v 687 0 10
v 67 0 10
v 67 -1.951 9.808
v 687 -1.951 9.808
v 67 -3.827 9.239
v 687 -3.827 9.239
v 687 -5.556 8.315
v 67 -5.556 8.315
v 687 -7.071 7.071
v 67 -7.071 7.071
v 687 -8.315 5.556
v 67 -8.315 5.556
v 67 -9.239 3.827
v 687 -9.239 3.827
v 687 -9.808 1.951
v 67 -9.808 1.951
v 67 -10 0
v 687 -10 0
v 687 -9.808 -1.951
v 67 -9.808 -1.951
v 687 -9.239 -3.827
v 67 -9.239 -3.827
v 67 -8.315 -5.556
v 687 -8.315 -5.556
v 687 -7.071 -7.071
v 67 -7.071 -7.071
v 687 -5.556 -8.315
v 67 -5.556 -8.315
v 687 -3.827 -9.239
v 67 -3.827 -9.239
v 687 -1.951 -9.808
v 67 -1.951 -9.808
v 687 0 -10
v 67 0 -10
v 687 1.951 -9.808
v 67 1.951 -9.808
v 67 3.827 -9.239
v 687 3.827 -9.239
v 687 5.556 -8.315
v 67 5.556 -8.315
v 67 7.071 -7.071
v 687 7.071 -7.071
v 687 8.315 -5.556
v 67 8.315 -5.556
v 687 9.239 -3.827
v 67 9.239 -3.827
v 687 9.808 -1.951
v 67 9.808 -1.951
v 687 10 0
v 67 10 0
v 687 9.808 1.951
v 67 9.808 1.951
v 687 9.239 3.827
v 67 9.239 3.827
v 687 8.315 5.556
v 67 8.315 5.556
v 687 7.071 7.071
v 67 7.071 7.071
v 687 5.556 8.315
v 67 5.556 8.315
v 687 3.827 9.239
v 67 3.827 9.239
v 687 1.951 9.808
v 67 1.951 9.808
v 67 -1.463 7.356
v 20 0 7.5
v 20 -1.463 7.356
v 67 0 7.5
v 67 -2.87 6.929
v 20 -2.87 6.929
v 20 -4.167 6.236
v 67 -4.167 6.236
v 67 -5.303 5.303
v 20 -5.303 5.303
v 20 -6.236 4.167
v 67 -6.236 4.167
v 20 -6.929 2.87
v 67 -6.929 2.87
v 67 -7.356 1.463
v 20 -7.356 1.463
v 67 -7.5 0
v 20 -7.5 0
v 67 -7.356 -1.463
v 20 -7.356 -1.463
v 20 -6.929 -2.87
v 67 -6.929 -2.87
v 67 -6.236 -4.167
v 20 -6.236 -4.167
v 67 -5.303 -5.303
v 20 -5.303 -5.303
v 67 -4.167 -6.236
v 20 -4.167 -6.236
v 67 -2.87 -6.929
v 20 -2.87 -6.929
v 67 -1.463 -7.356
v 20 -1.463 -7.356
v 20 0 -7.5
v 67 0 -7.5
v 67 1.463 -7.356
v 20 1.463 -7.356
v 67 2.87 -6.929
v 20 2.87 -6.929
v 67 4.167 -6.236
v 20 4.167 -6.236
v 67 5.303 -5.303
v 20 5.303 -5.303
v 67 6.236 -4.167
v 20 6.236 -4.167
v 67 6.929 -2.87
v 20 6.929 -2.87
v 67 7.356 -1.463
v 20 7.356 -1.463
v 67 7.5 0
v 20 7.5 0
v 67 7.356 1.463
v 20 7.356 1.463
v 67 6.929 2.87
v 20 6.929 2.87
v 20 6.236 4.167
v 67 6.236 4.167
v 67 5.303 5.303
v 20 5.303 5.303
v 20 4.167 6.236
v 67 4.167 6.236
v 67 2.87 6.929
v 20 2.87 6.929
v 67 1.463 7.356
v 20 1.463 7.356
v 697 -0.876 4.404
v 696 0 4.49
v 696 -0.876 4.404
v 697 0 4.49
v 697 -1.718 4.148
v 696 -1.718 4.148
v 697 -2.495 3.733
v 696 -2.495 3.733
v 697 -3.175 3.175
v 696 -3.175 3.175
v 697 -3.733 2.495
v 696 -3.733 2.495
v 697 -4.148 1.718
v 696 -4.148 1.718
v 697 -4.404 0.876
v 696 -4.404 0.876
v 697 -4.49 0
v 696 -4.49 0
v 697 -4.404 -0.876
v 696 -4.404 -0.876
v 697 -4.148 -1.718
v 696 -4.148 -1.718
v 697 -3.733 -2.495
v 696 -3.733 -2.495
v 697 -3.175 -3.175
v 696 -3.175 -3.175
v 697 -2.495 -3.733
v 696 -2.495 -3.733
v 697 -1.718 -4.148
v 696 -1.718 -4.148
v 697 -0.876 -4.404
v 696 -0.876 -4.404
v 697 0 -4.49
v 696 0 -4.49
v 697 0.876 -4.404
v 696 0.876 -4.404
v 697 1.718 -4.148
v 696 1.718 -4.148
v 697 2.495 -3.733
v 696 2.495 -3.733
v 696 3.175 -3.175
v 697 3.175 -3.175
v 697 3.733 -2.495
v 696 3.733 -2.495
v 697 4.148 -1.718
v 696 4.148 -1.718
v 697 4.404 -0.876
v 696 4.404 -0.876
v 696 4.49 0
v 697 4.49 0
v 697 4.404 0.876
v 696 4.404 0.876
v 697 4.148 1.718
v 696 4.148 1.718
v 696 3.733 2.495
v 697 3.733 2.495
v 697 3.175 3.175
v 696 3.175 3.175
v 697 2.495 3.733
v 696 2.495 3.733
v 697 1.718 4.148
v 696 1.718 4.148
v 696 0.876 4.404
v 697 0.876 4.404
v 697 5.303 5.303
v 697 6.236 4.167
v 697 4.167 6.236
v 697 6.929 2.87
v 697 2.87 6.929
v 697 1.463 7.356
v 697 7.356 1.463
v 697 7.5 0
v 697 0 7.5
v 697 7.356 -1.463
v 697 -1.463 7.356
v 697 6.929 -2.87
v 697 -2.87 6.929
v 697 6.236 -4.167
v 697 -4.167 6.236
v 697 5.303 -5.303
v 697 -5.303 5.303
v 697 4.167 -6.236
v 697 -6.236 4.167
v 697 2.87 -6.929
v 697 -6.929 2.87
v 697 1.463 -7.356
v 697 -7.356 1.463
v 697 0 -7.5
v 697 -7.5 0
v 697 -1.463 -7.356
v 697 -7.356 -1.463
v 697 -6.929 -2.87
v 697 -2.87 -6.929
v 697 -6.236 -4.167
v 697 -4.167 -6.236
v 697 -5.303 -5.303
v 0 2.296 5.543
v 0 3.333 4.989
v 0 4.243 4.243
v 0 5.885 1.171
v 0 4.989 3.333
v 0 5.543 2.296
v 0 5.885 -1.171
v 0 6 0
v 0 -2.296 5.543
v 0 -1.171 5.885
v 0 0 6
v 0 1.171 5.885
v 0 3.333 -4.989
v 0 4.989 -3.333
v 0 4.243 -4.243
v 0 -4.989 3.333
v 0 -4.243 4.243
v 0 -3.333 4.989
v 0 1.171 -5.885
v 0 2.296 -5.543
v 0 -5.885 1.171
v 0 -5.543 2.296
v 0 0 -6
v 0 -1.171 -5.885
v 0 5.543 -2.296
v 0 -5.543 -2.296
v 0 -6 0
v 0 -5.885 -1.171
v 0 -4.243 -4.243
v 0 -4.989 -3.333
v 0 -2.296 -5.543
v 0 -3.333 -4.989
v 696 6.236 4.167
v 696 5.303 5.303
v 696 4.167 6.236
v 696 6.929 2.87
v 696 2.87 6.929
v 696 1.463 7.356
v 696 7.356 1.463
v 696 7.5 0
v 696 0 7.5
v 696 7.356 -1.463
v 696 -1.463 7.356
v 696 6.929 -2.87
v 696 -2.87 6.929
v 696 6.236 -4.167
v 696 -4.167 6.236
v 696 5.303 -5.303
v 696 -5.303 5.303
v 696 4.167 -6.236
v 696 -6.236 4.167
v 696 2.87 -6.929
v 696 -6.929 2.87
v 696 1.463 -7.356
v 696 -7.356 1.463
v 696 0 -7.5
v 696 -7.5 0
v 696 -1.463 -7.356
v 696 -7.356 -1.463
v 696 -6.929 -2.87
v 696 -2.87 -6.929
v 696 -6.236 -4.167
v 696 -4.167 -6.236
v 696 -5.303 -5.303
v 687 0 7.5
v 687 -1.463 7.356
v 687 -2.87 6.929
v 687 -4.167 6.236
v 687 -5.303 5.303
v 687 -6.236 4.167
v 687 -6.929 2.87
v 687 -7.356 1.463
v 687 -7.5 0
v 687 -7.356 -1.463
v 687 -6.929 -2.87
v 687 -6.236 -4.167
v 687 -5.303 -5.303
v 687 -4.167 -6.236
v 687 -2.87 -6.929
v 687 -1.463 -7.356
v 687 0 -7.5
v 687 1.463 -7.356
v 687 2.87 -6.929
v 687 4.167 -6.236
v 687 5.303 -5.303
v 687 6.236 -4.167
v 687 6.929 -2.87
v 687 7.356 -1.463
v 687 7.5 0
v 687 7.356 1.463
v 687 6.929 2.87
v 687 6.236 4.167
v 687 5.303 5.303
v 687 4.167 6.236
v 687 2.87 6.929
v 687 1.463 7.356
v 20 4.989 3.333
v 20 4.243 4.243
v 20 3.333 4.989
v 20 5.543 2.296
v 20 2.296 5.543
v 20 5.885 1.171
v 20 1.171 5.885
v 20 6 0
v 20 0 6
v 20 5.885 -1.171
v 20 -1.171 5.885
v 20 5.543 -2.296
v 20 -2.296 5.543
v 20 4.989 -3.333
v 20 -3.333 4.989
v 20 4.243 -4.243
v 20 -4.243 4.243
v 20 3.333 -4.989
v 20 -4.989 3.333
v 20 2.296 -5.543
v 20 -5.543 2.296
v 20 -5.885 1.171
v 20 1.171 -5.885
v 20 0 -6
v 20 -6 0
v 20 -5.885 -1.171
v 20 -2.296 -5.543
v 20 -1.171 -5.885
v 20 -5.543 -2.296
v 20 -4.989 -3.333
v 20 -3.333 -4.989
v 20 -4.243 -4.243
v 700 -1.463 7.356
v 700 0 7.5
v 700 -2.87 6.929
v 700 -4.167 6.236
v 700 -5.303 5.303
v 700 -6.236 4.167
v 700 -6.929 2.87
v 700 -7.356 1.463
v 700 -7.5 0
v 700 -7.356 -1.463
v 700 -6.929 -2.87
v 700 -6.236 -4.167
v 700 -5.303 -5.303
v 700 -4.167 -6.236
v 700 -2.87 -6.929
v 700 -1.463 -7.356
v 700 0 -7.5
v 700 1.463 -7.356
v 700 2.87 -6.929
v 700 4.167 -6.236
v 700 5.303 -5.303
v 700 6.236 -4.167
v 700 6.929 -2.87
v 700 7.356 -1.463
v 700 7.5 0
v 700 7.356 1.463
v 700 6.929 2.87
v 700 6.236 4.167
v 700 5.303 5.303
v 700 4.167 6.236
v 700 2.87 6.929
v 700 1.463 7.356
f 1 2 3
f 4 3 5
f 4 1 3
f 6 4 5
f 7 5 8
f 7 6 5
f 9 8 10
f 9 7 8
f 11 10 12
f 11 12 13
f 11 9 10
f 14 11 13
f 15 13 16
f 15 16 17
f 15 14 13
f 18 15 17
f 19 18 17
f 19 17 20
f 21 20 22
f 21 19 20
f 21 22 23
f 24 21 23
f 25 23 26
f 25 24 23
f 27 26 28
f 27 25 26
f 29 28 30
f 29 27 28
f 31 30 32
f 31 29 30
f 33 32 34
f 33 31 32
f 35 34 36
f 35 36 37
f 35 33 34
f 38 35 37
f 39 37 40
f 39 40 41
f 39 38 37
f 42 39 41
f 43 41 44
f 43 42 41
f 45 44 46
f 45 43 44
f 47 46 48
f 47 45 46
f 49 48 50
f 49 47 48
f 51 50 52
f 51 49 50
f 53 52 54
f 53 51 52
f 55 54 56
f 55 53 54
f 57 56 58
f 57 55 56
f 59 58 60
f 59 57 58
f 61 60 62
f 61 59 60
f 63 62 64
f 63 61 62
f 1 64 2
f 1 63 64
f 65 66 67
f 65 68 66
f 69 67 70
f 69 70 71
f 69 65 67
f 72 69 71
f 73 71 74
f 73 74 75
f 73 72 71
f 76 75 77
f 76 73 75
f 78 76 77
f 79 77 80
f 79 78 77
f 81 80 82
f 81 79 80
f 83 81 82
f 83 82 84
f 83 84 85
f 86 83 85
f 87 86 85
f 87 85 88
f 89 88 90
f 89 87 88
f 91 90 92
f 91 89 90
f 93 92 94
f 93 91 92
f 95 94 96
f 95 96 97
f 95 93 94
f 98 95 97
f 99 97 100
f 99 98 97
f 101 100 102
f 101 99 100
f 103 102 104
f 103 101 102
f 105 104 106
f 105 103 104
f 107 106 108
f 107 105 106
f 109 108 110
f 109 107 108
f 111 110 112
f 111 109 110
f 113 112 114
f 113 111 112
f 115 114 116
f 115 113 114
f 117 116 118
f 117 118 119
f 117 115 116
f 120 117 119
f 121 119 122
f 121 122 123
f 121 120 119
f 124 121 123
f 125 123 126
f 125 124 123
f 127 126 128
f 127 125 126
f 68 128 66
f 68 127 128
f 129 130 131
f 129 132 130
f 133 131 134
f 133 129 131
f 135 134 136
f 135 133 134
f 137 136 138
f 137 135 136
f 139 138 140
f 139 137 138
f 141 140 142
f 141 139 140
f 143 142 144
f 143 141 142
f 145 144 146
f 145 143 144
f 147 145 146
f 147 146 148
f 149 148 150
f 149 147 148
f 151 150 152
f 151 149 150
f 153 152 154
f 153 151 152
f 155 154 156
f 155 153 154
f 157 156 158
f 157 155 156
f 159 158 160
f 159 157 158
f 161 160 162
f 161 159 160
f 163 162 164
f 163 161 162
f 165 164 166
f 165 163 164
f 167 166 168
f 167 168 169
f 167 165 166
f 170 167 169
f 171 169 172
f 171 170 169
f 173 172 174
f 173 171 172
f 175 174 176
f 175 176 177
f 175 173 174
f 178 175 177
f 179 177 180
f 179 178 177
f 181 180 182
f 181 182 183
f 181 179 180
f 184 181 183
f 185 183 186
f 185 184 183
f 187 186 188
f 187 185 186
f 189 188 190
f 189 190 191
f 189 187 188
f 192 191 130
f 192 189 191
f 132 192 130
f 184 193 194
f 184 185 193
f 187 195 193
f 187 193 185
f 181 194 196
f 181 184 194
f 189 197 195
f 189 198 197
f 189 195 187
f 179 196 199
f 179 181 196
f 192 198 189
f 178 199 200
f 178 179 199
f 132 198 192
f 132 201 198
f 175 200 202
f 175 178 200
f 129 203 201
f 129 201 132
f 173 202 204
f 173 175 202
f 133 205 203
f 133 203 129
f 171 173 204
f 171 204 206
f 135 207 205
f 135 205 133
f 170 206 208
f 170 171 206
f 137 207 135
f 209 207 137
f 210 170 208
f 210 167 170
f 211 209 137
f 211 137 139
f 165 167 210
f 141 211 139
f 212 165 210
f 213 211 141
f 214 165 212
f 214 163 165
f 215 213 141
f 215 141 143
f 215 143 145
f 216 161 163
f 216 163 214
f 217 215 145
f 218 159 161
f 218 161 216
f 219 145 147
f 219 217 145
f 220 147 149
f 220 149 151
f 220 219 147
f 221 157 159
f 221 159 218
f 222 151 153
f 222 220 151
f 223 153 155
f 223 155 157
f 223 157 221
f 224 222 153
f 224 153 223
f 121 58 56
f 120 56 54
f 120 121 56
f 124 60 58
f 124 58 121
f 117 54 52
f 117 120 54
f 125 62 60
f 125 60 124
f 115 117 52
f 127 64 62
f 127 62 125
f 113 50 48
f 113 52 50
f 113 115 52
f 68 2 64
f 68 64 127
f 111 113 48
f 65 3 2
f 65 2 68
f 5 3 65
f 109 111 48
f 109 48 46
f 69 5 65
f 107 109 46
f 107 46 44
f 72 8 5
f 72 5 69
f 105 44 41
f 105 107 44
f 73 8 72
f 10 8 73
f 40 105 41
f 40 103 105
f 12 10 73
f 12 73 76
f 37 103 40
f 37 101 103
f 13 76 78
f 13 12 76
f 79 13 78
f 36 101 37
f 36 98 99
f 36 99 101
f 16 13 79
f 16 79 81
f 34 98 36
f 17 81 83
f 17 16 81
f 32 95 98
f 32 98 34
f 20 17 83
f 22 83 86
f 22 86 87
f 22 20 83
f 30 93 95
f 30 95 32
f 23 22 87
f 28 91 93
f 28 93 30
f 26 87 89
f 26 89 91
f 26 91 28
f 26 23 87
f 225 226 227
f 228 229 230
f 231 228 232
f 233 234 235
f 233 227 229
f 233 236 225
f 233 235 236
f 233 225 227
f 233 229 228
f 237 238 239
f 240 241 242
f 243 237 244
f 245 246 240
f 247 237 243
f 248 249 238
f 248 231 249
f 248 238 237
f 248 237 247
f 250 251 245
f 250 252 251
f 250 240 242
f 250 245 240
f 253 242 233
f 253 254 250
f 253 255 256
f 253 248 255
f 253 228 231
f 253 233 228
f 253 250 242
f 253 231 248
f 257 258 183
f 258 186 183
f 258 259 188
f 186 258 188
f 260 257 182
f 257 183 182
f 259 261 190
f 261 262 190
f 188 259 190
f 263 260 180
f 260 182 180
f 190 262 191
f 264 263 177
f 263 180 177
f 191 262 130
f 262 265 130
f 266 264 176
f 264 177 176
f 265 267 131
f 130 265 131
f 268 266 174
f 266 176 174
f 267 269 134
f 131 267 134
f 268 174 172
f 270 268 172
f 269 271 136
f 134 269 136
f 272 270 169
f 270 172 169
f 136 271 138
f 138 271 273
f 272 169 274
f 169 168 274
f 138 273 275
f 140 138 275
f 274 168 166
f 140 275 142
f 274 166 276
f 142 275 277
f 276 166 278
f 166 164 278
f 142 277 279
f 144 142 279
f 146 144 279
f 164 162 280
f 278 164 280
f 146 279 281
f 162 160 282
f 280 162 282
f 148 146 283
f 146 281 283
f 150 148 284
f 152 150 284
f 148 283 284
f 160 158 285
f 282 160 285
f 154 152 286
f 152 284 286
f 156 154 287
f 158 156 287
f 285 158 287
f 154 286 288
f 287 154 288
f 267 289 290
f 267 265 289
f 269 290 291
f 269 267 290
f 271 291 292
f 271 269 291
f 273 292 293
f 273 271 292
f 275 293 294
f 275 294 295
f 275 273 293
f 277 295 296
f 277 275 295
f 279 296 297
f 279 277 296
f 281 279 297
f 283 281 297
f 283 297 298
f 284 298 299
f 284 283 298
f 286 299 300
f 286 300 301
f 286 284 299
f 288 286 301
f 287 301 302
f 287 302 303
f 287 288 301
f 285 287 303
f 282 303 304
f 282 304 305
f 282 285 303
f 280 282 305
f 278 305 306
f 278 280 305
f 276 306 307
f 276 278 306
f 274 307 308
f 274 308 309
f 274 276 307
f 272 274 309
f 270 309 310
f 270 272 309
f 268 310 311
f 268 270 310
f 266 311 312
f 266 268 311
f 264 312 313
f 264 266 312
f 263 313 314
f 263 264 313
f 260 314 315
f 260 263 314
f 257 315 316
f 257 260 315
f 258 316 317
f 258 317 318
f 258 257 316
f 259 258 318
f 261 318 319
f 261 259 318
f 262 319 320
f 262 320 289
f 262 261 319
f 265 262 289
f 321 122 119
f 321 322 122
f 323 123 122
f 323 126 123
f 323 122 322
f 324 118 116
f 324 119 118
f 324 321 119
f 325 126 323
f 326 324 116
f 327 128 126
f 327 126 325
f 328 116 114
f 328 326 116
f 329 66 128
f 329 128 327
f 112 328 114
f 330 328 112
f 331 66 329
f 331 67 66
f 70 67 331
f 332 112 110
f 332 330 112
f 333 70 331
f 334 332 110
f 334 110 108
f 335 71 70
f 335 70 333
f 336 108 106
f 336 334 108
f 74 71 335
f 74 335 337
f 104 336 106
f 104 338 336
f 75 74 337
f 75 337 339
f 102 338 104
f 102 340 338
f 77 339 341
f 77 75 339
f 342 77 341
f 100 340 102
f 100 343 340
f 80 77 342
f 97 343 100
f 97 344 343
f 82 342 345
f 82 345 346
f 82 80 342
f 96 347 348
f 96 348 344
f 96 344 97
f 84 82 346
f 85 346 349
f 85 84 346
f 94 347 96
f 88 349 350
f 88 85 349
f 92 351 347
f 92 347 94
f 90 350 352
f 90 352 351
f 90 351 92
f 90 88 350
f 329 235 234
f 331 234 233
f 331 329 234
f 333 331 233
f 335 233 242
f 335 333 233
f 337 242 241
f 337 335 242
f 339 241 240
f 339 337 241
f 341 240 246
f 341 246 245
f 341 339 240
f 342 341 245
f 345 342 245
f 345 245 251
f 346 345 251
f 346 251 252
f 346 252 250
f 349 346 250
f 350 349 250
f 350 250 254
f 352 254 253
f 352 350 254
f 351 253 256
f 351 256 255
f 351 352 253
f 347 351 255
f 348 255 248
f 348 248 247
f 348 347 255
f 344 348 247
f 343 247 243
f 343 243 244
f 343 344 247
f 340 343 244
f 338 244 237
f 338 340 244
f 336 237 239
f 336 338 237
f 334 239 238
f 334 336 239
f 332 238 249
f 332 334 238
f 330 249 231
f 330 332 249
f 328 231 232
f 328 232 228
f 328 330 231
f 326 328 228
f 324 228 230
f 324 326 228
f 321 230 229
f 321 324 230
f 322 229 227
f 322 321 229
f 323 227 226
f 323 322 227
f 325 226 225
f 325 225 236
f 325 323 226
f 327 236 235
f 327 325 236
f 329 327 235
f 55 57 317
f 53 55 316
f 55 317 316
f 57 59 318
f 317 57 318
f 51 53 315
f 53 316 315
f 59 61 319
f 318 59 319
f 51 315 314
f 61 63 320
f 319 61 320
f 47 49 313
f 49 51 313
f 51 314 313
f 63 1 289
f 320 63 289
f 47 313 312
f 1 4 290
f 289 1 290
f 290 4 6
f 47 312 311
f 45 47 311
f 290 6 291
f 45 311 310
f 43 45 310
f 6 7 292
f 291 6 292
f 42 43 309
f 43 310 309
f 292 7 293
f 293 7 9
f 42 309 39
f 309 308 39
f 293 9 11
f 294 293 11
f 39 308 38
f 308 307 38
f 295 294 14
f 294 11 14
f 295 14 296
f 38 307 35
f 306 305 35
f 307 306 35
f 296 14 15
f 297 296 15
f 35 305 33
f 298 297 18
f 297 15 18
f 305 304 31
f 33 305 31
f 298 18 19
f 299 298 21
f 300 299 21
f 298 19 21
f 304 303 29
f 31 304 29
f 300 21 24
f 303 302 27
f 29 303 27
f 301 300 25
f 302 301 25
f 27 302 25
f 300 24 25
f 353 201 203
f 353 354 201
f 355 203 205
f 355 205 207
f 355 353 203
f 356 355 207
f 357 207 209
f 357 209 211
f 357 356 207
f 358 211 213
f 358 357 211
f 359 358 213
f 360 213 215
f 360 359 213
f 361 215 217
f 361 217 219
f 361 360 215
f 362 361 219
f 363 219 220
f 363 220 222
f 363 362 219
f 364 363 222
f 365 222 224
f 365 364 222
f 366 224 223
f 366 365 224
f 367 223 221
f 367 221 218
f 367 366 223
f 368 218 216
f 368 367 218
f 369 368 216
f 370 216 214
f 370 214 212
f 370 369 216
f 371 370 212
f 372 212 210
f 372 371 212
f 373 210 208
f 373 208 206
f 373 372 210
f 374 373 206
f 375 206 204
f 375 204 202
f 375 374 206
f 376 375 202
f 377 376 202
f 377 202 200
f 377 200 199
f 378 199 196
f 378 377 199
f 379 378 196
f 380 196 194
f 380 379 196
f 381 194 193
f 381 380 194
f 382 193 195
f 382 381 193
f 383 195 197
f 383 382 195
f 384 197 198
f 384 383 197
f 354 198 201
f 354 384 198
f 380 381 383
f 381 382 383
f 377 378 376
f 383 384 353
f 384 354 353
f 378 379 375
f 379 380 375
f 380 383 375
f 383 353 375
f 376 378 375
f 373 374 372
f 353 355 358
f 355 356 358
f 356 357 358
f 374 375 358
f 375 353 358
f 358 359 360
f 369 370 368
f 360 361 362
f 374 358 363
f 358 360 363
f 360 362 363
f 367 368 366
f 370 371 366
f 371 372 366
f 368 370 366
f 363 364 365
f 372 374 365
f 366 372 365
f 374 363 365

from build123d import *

# Parameters (mm, degrees)
SKETCH_W      = 700
SKETCH_H      = 10
SKETCH001_W   = 67
SKETCH001_H   = 2.5
SKETCH002_W   = 20
SKETCH002_H   = 1.5
SKETCH003_W   = 13
SKETCH003_H   = 2.5
SKETCH003_W_2 = 1
SKETCH003_H_2 = 3.01


with BuildPart() as part:
    # Sketch → Revolution (revolve)
    with BuildSketch(Plane.XZ):
        with Locations((350, 5)):
            Rectangle(SKETCH_W, SKETCH_H)
    revolve(axis=Axis((0, 0, 0), (1, 0, 0)))

    # Sketch001 → Groove (revolve, cut)
    with BuildSketch(Plane.XZ):
        with Locations((33.5, 8.75)):
            Rectangle(SKETCH001_W, SKETCH001_H)
    revolve(axis=Axis((0, 0, 0), (1, 0, 0)), mode=Mode.SUBTRACT)

    # Sketch002 → Groove001 (revolve, cut)
    with BuildSketch(Plane.XZ):
        with Locations((10, 6.75)):
            Rectangle(SKETCH002_W, SKETCH002_H)
    revolve(axis=Axis((0, 0, 0), (1, 0, 0)), mode=Mode.SUBTRACT)

    # Sketch003 → Groove002 (revolve, cut)
    with BuildSketch(Plane.XZ):
        with Locations((693.5, 8.75)):
            Rectangle(SKETCH003_W, SKETCH003_H)
        with Locations((696.5, 5.995)):
            Rectangle(SKETCH003_W_2, SKETCH003_H_2)
    revolve(axis=Axis((0, 0, 0), (1, 0, 0)), mode=Mode.SUBTRACT)


solid = part.part
